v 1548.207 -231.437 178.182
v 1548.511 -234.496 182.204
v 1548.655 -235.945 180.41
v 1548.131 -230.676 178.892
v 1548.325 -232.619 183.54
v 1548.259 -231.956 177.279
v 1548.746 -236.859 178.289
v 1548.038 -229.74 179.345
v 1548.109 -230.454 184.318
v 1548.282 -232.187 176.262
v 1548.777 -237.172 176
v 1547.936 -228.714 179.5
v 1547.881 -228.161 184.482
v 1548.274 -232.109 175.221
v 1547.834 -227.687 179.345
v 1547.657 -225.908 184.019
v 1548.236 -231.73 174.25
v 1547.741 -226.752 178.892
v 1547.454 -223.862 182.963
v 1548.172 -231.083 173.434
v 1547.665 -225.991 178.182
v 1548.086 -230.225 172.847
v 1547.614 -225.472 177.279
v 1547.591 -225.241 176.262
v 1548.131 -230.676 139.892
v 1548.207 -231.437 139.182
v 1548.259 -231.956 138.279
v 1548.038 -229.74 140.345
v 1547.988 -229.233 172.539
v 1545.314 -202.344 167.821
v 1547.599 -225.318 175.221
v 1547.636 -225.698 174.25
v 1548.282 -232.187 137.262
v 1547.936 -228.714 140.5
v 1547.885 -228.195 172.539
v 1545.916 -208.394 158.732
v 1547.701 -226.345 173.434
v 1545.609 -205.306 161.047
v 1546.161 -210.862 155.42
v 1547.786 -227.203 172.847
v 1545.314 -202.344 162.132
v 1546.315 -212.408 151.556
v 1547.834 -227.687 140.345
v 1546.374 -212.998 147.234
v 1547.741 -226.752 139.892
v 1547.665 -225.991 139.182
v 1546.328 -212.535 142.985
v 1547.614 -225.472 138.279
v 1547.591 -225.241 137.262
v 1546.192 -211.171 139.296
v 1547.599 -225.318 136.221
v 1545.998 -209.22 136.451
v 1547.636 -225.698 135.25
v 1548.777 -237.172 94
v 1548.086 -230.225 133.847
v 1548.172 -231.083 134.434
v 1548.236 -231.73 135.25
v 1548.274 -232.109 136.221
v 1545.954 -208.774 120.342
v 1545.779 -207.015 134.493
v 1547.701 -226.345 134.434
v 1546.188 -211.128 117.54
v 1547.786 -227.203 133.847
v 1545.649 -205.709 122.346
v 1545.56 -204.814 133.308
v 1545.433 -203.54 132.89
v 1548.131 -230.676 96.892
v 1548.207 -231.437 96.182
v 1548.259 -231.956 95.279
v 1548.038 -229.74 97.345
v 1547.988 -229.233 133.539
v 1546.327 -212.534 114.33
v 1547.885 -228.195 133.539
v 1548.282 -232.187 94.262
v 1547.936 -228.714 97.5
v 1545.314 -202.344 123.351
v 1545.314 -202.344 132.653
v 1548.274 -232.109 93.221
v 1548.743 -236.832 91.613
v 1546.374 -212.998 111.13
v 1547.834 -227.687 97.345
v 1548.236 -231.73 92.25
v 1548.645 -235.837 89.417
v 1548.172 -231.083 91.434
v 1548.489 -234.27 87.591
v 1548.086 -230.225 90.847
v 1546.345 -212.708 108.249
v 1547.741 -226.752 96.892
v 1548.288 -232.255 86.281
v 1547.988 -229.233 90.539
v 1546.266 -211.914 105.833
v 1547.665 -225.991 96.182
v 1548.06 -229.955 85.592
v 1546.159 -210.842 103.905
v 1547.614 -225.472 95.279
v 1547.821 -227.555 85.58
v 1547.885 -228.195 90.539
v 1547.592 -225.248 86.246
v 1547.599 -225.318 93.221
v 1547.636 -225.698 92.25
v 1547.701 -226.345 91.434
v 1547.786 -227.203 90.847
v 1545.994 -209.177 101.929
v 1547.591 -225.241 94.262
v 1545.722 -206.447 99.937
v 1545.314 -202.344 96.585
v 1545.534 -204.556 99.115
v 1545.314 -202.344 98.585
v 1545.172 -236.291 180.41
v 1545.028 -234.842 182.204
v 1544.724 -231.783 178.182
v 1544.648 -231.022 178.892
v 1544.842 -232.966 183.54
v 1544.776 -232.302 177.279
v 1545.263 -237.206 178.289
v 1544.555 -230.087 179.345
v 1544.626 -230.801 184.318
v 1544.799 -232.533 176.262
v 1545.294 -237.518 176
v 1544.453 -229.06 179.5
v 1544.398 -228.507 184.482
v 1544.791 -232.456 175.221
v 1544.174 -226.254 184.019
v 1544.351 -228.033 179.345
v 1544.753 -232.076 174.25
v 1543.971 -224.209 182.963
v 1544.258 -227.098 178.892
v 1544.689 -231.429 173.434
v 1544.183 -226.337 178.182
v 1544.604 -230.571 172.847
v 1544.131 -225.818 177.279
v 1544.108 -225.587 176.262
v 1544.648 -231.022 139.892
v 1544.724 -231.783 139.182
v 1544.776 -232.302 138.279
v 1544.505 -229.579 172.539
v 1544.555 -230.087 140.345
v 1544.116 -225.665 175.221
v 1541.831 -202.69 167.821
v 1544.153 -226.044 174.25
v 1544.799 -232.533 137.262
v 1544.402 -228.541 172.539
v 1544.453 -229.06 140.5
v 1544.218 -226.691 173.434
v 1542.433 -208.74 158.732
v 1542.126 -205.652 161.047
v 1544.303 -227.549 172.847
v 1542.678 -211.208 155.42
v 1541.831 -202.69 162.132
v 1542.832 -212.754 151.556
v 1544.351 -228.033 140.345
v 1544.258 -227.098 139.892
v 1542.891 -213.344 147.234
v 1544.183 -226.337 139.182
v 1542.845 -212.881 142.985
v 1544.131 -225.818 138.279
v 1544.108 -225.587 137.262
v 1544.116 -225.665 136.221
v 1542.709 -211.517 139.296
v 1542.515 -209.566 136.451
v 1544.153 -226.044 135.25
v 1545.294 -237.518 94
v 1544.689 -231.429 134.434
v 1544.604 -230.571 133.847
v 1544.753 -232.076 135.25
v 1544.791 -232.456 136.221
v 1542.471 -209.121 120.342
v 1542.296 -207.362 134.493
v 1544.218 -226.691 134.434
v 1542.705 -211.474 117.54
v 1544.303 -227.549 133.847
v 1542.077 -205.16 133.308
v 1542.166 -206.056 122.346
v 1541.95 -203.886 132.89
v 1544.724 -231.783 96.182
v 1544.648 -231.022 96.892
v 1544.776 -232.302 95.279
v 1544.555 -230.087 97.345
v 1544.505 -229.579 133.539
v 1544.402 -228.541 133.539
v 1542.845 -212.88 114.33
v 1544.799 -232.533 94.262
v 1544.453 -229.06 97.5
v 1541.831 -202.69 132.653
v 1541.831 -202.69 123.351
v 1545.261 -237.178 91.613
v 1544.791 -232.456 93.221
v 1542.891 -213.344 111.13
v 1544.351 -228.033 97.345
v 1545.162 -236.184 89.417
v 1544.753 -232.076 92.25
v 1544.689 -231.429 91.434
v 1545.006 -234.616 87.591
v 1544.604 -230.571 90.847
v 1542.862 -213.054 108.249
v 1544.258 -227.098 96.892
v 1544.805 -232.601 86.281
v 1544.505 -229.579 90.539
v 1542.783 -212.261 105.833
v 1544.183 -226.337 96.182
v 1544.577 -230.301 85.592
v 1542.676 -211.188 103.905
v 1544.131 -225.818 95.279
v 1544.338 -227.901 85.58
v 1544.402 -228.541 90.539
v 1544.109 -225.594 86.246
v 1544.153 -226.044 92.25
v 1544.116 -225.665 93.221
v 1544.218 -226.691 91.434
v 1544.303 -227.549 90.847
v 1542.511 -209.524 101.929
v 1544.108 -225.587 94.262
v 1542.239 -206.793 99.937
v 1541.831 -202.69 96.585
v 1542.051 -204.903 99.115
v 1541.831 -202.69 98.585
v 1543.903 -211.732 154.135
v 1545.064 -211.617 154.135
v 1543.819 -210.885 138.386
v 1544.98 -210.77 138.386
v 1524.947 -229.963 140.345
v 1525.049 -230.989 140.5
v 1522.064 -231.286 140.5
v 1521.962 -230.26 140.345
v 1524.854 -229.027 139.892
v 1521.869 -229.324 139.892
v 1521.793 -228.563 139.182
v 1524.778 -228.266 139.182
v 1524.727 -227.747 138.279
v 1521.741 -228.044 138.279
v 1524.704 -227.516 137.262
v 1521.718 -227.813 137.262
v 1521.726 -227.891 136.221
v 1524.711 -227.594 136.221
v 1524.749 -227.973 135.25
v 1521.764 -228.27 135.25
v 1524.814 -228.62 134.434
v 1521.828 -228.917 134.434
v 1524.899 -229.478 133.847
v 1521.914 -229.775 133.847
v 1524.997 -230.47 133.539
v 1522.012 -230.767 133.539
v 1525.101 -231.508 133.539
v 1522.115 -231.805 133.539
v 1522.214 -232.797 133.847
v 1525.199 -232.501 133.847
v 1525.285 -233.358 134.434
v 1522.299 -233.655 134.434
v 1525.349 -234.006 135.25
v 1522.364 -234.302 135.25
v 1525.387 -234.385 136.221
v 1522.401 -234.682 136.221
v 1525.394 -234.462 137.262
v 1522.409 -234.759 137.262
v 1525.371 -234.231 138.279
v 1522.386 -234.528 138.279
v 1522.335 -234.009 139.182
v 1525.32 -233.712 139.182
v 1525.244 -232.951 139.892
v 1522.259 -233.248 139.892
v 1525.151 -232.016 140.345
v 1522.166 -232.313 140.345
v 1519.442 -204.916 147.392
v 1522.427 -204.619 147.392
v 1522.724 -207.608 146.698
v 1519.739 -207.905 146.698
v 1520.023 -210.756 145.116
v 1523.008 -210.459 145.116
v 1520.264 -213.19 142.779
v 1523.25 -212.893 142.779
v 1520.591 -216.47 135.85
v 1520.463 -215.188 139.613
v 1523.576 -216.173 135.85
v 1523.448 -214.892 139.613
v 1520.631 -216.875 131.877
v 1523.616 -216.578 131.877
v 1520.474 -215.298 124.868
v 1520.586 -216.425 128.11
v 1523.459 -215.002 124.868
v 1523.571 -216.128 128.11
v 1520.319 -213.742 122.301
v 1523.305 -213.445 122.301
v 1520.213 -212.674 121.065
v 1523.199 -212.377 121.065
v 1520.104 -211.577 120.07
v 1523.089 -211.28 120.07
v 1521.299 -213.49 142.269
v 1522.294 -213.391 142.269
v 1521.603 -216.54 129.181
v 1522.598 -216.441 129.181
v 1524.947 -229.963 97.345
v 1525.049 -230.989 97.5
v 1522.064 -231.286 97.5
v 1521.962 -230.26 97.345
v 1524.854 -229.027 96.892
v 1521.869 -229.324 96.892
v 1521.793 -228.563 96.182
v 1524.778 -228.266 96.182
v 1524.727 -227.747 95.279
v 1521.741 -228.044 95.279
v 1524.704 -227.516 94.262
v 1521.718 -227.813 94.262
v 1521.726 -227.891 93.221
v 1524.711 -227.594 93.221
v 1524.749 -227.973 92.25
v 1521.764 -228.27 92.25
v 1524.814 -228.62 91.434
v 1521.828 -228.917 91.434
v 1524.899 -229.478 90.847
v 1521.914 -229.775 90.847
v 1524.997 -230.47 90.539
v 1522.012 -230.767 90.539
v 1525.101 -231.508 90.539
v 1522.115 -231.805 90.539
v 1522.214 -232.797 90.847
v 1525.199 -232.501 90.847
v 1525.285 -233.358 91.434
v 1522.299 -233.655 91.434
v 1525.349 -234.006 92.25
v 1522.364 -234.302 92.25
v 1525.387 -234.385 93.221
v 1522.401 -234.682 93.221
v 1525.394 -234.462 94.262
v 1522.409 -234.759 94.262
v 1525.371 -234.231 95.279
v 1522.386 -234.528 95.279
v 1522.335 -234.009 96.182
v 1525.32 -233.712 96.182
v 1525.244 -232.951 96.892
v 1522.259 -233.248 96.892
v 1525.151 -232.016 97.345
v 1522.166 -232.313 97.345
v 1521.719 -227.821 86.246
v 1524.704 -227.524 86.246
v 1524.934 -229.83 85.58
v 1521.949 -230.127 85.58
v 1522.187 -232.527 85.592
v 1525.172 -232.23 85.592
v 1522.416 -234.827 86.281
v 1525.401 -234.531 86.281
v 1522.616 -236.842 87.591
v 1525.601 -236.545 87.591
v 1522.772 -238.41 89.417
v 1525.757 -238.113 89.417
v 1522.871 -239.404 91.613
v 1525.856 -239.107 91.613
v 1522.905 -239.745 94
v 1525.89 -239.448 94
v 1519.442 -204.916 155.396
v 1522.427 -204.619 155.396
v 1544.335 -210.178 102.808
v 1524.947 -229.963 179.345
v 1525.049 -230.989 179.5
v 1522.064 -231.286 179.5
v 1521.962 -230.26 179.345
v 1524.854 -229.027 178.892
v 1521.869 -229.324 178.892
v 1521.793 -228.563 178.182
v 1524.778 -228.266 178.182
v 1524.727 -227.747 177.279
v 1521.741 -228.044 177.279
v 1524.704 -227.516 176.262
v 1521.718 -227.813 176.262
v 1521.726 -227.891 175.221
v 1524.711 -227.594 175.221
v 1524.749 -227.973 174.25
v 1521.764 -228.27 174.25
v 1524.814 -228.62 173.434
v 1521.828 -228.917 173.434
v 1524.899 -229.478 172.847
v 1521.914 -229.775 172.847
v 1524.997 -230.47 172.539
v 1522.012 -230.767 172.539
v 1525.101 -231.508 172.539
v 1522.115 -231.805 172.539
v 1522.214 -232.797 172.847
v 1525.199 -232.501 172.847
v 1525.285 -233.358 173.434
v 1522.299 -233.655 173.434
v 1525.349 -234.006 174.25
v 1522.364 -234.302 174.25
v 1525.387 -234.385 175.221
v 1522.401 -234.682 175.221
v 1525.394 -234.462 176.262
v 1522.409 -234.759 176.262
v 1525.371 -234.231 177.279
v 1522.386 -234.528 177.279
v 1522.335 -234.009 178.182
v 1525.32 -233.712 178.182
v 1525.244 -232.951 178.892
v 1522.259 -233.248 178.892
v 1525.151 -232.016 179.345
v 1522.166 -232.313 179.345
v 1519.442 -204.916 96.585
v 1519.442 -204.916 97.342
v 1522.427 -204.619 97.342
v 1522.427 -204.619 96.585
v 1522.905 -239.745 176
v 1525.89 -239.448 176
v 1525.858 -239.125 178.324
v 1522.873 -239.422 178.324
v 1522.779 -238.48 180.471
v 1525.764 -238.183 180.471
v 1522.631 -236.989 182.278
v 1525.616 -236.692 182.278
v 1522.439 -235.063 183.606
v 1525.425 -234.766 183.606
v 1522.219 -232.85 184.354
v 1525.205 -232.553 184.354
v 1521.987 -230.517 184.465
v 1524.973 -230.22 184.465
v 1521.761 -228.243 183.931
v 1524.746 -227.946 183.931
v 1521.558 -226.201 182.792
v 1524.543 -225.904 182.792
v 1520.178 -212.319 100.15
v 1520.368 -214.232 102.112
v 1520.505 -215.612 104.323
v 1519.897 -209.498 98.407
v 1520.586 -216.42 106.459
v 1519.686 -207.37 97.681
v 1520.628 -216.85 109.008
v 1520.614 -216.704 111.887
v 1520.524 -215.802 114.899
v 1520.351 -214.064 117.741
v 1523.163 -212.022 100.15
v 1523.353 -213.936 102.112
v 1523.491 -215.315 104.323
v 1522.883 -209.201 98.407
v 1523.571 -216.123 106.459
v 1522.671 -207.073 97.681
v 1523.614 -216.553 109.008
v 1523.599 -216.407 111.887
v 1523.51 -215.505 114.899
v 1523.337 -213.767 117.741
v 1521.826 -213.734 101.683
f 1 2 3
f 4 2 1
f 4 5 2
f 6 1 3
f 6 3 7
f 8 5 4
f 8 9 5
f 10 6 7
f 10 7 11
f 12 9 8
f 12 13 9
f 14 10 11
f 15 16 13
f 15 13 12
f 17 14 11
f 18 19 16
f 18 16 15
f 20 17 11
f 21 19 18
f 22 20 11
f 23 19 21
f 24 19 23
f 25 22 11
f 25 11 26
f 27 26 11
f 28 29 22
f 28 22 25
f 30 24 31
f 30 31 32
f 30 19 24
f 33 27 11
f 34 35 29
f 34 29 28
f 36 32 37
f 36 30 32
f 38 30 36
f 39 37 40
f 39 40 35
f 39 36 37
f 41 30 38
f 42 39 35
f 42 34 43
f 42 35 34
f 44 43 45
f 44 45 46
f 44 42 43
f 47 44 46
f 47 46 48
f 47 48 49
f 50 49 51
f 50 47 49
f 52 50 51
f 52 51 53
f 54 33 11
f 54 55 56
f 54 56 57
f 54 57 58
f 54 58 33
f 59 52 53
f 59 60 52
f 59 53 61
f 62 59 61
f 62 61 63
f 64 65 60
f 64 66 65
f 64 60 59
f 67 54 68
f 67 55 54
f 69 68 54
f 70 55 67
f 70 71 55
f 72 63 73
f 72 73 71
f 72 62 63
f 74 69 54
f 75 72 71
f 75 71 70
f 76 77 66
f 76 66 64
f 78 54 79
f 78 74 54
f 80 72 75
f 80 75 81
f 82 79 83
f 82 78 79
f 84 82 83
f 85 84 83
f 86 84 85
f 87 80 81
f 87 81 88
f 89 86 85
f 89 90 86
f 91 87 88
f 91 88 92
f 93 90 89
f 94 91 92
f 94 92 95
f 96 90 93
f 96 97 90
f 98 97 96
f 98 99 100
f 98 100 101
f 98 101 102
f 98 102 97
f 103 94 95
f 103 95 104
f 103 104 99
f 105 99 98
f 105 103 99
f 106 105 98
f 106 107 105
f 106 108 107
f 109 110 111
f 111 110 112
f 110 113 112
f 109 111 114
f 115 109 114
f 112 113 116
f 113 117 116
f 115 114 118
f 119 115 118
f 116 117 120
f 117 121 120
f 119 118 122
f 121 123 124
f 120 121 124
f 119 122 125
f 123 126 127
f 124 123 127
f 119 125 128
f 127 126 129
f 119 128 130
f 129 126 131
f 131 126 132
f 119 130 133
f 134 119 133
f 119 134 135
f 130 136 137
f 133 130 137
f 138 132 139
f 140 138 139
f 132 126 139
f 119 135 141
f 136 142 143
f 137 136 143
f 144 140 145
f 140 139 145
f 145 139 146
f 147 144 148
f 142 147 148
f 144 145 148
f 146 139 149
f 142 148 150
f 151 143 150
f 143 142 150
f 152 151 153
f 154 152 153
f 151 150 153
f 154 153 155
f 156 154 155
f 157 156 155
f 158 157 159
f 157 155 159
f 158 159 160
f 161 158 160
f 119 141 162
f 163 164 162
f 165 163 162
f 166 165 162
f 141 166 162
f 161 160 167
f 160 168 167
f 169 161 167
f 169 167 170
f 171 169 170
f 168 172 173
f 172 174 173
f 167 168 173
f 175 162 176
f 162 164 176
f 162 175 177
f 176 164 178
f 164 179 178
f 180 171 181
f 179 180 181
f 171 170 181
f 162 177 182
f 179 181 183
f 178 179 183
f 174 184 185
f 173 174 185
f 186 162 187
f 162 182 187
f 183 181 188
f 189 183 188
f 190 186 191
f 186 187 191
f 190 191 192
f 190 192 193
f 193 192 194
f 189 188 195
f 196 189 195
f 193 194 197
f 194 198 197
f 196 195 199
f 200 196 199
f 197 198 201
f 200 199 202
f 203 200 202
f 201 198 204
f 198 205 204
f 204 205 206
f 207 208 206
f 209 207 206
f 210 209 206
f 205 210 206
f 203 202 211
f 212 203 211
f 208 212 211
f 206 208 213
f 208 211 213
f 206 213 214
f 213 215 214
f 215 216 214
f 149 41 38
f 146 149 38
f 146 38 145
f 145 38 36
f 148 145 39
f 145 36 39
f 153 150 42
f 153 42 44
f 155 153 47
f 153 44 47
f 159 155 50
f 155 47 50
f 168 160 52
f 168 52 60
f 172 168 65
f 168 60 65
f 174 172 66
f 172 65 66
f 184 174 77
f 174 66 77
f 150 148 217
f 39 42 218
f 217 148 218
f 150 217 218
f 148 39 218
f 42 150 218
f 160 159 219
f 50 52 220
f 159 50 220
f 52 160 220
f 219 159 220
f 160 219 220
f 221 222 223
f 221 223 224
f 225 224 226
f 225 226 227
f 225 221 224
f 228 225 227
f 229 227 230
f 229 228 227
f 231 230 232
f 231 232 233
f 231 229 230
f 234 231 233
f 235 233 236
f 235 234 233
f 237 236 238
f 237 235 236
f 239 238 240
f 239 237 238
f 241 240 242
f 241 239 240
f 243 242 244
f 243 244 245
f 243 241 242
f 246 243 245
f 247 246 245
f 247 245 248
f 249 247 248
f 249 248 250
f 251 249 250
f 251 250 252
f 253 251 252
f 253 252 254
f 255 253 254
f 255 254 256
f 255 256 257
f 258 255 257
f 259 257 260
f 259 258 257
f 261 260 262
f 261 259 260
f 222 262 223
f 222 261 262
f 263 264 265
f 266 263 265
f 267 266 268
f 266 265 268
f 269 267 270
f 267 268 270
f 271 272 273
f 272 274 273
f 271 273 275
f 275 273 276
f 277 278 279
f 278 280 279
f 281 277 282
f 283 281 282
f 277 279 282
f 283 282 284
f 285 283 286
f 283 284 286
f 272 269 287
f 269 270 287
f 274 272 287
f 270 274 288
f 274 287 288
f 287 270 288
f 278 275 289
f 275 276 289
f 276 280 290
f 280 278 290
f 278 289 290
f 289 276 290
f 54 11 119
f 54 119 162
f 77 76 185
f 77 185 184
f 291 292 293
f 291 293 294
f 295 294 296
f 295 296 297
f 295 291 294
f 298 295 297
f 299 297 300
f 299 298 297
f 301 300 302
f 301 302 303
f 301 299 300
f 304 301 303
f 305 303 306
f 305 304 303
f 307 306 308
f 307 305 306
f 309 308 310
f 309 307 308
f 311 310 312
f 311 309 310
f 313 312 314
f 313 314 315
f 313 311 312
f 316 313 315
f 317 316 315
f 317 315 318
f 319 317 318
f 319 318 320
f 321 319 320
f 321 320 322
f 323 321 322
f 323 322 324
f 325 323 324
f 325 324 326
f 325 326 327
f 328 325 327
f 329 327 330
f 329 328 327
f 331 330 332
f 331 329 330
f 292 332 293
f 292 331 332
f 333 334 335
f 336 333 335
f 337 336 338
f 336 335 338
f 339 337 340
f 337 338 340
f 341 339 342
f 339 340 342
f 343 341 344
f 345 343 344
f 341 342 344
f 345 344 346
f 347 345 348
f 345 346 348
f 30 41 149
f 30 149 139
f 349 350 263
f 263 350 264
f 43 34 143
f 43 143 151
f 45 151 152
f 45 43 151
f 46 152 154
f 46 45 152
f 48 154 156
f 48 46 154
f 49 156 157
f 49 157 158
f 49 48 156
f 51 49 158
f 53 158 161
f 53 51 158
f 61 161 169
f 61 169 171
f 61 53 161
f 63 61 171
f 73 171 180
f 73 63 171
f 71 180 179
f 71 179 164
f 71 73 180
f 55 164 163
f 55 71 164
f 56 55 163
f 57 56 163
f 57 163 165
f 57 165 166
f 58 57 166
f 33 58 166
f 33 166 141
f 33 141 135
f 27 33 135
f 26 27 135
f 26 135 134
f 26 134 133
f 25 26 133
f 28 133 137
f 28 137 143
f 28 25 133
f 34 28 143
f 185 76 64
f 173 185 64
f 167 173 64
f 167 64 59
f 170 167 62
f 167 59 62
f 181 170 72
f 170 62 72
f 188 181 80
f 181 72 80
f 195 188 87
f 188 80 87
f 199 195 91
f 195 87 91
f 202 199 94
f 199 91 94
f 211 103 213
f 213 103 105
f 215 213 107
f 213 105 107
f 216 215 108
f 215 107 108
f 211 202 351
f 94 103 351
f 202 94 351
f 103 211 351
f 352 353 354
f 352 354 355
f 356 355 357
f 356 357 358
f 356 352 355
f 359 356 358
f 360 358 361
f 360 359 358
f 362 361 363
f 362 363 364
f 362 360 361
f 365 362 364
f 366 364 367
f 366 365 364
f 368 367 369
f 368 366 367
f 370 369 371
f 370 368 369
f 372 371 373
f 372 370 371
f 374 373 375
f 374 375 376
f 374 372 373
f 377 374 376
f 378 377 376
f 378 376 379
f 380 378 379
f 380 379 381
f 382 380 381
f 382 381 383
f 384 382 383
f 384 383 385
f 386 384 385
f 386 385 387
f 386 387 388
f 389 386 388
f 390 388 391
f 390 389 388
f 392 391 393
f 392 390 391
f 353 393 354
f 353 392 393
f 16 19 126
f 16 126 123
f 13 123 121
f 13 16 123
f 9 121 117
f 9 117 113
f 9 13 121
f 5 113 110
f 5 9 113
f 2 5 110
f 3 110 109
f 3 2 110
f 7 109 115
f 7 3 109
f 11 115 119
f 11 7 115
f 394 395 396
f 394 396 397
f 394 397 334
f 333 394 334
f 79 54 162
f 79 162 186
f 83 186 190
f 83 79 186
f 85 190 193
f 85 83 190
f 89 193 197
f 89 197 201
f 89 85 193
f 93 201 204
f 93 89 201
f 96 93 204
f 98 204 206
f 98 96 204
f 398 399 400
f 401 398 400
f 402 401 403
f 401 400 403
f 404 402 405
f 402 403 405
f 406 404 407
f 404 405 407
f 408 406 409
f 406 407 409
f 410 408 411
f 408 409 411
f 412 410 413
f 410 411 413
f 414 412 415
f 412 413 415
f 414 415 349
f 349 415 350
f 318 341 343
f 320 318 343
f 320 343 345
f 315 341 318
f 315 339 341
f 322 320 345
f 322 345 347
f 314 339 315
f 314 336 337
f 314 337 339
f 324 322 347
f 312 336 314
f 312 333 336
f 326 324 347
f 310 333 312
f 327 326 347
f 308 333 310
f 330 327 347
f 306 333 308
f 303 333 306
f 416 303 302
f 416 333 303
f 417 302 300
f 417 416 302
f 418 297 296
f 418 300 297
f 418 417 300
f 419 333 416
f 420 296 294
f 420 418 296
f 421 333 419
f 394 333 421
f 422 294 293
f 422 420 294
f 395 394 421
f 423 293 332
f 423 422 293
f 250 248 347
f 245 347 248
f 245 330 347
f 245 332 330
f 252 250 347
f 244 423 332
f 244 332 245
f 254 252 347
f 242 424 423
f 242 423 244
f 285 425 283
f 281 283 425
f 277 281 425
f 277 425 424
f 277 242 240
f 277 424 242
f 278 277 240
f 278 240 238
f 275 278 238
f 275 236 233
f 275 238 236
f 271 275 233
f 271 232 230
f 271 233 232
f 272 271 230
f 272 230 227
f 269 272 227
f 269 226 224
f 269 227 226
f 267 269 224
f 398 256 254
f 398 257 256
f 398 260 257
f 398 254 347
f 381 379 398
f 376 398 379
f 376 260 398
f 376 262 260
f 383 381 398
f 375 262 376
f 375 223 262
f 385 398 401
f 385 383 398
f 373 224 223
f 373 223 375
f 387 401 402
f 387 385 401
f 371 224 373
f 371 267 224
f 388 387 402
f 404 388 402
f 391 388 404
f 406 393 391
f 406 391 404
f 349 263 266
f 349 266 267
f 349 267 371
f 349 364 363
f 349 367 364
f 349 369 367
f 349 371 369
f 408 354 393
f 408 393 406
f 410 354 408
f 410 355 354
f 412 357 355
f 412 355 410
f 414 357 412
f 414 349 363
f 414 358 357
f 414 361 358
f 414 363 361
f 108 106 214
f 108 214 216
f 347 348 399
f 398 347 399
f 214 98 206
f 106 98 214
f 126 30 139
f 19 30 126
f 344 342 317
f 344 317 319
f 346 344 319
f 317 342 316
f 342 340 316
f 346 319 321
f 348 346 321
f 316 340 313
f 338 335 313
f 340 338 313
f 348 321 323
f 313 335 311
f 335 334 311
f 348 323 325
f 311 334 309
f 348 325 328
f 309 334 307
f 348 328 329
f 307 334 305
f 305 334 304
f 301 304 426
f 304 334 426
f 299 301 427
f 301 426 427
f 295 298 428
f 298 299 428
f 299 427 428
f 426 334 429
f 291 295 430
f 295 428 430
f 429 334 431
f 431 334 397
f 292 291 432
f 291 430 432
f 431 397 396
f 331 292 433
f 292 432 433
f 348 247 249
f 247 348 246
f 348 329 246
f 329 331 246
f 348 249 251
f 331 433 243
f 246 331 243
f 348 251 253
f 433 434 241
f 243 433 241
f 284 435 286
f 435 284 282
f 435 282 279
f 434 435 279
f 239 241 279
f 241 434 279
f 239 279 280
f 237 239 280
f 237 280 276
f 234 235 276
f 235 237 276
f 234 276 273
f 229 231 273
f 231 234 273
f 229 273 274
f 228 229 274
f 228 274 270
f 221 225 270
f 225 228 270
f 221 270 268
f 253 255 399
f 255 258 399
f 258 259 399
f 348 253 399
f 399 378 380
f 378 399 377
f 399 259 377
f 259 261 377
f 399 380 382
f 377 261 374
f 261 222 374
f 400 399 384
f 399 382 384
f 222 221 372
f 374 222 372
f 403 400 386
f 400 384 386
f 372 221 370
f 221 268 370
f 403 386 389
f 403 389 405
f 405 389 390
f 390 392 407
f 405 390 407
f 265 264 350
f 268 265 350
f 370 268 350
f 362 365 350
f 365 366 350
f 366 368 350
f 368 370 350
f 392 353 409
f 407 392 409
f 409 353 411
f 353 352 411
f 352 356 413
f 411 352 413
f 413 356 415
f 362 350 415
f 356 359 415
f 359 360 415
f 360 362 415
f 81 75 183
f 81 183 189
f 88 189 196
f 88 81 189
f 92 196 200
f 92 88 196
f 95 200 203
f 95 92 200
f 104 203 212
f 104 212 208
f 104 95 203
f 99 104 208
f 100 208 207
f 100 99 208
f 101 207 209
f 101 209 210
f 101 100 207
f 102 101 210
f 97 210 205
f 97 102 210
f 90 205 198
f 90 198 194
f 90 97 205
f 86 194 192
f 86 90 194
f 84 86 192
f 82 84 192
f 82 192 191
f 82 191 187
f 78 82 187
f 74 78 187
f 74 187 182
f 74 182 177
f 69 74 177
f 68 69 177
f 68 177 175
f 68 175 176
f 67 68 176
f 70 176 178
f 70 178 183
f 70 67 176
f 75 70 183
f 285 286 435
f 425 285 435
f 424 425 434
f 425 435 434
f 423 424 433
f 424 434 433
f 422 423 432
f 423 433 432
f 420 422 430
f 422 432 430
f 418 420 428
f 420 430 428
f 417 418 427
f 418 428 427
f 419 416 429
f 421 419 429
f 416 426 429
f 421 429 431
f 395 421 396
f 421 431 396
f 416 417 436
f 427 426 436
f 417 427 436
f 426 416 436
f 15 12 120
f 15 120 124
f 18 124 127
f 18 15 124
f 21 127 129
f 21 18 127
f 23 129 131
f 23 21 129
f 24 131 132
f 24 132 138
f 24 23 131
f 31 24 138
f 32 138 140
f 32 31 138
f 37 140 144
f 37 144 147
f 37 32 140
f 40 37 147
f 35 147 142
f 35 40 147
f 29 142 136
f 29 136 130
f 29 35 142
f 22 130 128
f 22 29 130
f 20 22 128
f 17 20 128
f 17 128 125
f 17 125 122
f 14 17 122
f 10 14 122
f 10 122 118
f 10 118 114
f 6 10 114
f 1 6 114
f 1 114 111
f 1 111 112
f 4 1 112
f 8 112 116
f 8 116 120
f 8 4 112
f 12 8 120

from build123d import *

# Parameters (mm, degrees)
SZKIC1_R                    = 3.5
DODANIE_WYCI_GNI_CIE1_DEPTH = 3.5
SZKIC2_R                    = 3.5
DODANIE_WYCI_GNI_CIE2_DEPTH = 3


with BuildPart() as part:
    # Szkic1 → Dodanie-wyciągnięcie1 (new body)
    with BuildSketch(Plane(origin=(1510.26539917, 150.162347119, 0), x_dir=(0, 0, 1), z_dir=(-0.995093407, -0.098939936, 0))):
        with BuildLine():
            Line((176, -389.244285112), (94, -389.244285112))
            ThreePointArc((94, -389.244285112), (86.863716206, -385.362017631), (86.246247121, -377.261568315))
            Line((86.246247121, -377.261568315), (96.584812208, -354.244285112))
            Line((96.584812208, -354.244285112), (98.584812208, -354.244285112))
            add(Edge.make_bspline(
                [(123.351051733, -354.244285112), (121.451794076, -366.991661985), (109.953835715, -368.077613983), (102.808126789, -361.943543508), (100.700327503, -360.134151396), (99.055830817, -357.52813016), (98.584812208, -354.244285112)],
                knots=[0.177741768, 0.177741768, 0.177741768, 0.177741768, 0.5, 0.5, 0.5, 0.636368468, 0.636368468, 0.636368468, 0.636368468], degree=3, weights=[0.541770017, 0.417579029, 0.570322357, 1, 0.818175377, 0.685941044, 0.603297001]))
            Line((123.351051733, -354.244285112), (132.653019729, -354.244285112))
            add(Edge.make_bspline(
                [(162.132083494, -354.244285112), (157.83407929, -374.622201078), (135.082547526, -371.957513924), (132.653019729, -354.244285112)],
                knots=[0.555739934, 0.555739934, 0.555739934, 0.555739934, 0.989987358, 0.989987358, 0.989987358, 0.989987358], degree=3, weights=[0.801895785, 0.351992143, 0.404944032, 0.960751454]))
            Line((162.132083494, -354.244285112), (167.821084242, -354.244285112))
            Line((167.821084242, -354.244285112), (182.962792376, -375.868885403))
            ThreePointArc((182.962792376, -375.868885403), (183.539592082, -384.669148324), (176, -389.244285112))
        make_face()
        with Locations((176, -380.744285112)):
            Circle(SZKIC1_R, mode=Mode.SUBTRACT)
        with Locations((137, -380.744285112)):
            Circle(SZKIC1_R, mode=Mode.SUBTRACT)
        with Locations((94, -380.744285112)):
            Circle(SZKIC1_R, mode=Mode.SUBTRACT)
    extrude(amount=DODANIE_WYCI_GNI_CIE1_DEPTH)


with BuildPart() as body_2:
    # Szkic2 → Dodanie-wyciągnięcie2 (new body)
    with BuildSketch(Plane(origin=(1487.378250803, 147.886728596, 0), x_dir=(0, 0, 1), z_dir=(-0.995093407, -0.098939936, 0))):
        with BuildLine():
            Line((94, -389.244285112), (176, -389.244285112))
            ThreePointArc((176, -389.244285112), (183.605532693, -384.539791989), (182.792200387, -375.633902161))
            Line((182.792200387, -375.633902161), (155.396482628, -354.244285112))
            Line((155.396482628, -354.244285112), (147.392323291, -354.244285112))
            add(Edge.make_bspline(
                [(147.392323291, -354.244285112), (146.155727883, -368.865974762), (129.40362382, -372.625709898), (120.0699746, -360.937702969)],
                knots=[0.514263128, 0.514263128, 0.514263128, 0.514263128, 1, 1, 1, 1], degree=3, weights=[0.960864578, 0.529651942, 0.542697083, 1]))
            add(Edge.make_bspline(
                [(120.0699746, -360.937702969), (114.863351071, -368.326546813), (106.77470385, -367.625007076), (101.683038198, -363.254183094), (99.274683189, -361.186785793), (97.48553021, -358.103092297), (97.341630267, -354.244285112)],
                knots=[0.238017488, 0.238017488, 0.238017488, 0.238017488, 0.5, 0.5, 0.5, 0.651875895, 0.651875895, 0.651875895, 0.651875895], degree=3, weights=[0.501148645, 0.484406199, 0.650689984, 1, 0.797498807, 0.656507714, 0.57702672]))
            Line((97.341630267, -354.244285112), (96.584812208, -354.244285112))
            Line((96.584812208, -354.244285112), (86.246247121, -377.261568315))
            ThreePointArc((86.246247121, -377.261568315), (86.863716206, -385.362017631), (94, -389.244285112))
        make_face()
        with Locations((94, -380.744285112)):
            Circle(SZKIC2_R, mode=Mode.SUBTRACT)
        with Locations((137, -380.744285112)):
            Circle(SZKIC2_R, mode=Mode.SUBTRACT)
        with Locations((176, -380.744285112)):
            Circle(SZKIC2_R, mode=Mode.SUBTRACT)
    extrude(amount=DODANIE_WYCI_GNI_CIE2_DEPTH)


solid = Compound([part.part, body_2.part])
